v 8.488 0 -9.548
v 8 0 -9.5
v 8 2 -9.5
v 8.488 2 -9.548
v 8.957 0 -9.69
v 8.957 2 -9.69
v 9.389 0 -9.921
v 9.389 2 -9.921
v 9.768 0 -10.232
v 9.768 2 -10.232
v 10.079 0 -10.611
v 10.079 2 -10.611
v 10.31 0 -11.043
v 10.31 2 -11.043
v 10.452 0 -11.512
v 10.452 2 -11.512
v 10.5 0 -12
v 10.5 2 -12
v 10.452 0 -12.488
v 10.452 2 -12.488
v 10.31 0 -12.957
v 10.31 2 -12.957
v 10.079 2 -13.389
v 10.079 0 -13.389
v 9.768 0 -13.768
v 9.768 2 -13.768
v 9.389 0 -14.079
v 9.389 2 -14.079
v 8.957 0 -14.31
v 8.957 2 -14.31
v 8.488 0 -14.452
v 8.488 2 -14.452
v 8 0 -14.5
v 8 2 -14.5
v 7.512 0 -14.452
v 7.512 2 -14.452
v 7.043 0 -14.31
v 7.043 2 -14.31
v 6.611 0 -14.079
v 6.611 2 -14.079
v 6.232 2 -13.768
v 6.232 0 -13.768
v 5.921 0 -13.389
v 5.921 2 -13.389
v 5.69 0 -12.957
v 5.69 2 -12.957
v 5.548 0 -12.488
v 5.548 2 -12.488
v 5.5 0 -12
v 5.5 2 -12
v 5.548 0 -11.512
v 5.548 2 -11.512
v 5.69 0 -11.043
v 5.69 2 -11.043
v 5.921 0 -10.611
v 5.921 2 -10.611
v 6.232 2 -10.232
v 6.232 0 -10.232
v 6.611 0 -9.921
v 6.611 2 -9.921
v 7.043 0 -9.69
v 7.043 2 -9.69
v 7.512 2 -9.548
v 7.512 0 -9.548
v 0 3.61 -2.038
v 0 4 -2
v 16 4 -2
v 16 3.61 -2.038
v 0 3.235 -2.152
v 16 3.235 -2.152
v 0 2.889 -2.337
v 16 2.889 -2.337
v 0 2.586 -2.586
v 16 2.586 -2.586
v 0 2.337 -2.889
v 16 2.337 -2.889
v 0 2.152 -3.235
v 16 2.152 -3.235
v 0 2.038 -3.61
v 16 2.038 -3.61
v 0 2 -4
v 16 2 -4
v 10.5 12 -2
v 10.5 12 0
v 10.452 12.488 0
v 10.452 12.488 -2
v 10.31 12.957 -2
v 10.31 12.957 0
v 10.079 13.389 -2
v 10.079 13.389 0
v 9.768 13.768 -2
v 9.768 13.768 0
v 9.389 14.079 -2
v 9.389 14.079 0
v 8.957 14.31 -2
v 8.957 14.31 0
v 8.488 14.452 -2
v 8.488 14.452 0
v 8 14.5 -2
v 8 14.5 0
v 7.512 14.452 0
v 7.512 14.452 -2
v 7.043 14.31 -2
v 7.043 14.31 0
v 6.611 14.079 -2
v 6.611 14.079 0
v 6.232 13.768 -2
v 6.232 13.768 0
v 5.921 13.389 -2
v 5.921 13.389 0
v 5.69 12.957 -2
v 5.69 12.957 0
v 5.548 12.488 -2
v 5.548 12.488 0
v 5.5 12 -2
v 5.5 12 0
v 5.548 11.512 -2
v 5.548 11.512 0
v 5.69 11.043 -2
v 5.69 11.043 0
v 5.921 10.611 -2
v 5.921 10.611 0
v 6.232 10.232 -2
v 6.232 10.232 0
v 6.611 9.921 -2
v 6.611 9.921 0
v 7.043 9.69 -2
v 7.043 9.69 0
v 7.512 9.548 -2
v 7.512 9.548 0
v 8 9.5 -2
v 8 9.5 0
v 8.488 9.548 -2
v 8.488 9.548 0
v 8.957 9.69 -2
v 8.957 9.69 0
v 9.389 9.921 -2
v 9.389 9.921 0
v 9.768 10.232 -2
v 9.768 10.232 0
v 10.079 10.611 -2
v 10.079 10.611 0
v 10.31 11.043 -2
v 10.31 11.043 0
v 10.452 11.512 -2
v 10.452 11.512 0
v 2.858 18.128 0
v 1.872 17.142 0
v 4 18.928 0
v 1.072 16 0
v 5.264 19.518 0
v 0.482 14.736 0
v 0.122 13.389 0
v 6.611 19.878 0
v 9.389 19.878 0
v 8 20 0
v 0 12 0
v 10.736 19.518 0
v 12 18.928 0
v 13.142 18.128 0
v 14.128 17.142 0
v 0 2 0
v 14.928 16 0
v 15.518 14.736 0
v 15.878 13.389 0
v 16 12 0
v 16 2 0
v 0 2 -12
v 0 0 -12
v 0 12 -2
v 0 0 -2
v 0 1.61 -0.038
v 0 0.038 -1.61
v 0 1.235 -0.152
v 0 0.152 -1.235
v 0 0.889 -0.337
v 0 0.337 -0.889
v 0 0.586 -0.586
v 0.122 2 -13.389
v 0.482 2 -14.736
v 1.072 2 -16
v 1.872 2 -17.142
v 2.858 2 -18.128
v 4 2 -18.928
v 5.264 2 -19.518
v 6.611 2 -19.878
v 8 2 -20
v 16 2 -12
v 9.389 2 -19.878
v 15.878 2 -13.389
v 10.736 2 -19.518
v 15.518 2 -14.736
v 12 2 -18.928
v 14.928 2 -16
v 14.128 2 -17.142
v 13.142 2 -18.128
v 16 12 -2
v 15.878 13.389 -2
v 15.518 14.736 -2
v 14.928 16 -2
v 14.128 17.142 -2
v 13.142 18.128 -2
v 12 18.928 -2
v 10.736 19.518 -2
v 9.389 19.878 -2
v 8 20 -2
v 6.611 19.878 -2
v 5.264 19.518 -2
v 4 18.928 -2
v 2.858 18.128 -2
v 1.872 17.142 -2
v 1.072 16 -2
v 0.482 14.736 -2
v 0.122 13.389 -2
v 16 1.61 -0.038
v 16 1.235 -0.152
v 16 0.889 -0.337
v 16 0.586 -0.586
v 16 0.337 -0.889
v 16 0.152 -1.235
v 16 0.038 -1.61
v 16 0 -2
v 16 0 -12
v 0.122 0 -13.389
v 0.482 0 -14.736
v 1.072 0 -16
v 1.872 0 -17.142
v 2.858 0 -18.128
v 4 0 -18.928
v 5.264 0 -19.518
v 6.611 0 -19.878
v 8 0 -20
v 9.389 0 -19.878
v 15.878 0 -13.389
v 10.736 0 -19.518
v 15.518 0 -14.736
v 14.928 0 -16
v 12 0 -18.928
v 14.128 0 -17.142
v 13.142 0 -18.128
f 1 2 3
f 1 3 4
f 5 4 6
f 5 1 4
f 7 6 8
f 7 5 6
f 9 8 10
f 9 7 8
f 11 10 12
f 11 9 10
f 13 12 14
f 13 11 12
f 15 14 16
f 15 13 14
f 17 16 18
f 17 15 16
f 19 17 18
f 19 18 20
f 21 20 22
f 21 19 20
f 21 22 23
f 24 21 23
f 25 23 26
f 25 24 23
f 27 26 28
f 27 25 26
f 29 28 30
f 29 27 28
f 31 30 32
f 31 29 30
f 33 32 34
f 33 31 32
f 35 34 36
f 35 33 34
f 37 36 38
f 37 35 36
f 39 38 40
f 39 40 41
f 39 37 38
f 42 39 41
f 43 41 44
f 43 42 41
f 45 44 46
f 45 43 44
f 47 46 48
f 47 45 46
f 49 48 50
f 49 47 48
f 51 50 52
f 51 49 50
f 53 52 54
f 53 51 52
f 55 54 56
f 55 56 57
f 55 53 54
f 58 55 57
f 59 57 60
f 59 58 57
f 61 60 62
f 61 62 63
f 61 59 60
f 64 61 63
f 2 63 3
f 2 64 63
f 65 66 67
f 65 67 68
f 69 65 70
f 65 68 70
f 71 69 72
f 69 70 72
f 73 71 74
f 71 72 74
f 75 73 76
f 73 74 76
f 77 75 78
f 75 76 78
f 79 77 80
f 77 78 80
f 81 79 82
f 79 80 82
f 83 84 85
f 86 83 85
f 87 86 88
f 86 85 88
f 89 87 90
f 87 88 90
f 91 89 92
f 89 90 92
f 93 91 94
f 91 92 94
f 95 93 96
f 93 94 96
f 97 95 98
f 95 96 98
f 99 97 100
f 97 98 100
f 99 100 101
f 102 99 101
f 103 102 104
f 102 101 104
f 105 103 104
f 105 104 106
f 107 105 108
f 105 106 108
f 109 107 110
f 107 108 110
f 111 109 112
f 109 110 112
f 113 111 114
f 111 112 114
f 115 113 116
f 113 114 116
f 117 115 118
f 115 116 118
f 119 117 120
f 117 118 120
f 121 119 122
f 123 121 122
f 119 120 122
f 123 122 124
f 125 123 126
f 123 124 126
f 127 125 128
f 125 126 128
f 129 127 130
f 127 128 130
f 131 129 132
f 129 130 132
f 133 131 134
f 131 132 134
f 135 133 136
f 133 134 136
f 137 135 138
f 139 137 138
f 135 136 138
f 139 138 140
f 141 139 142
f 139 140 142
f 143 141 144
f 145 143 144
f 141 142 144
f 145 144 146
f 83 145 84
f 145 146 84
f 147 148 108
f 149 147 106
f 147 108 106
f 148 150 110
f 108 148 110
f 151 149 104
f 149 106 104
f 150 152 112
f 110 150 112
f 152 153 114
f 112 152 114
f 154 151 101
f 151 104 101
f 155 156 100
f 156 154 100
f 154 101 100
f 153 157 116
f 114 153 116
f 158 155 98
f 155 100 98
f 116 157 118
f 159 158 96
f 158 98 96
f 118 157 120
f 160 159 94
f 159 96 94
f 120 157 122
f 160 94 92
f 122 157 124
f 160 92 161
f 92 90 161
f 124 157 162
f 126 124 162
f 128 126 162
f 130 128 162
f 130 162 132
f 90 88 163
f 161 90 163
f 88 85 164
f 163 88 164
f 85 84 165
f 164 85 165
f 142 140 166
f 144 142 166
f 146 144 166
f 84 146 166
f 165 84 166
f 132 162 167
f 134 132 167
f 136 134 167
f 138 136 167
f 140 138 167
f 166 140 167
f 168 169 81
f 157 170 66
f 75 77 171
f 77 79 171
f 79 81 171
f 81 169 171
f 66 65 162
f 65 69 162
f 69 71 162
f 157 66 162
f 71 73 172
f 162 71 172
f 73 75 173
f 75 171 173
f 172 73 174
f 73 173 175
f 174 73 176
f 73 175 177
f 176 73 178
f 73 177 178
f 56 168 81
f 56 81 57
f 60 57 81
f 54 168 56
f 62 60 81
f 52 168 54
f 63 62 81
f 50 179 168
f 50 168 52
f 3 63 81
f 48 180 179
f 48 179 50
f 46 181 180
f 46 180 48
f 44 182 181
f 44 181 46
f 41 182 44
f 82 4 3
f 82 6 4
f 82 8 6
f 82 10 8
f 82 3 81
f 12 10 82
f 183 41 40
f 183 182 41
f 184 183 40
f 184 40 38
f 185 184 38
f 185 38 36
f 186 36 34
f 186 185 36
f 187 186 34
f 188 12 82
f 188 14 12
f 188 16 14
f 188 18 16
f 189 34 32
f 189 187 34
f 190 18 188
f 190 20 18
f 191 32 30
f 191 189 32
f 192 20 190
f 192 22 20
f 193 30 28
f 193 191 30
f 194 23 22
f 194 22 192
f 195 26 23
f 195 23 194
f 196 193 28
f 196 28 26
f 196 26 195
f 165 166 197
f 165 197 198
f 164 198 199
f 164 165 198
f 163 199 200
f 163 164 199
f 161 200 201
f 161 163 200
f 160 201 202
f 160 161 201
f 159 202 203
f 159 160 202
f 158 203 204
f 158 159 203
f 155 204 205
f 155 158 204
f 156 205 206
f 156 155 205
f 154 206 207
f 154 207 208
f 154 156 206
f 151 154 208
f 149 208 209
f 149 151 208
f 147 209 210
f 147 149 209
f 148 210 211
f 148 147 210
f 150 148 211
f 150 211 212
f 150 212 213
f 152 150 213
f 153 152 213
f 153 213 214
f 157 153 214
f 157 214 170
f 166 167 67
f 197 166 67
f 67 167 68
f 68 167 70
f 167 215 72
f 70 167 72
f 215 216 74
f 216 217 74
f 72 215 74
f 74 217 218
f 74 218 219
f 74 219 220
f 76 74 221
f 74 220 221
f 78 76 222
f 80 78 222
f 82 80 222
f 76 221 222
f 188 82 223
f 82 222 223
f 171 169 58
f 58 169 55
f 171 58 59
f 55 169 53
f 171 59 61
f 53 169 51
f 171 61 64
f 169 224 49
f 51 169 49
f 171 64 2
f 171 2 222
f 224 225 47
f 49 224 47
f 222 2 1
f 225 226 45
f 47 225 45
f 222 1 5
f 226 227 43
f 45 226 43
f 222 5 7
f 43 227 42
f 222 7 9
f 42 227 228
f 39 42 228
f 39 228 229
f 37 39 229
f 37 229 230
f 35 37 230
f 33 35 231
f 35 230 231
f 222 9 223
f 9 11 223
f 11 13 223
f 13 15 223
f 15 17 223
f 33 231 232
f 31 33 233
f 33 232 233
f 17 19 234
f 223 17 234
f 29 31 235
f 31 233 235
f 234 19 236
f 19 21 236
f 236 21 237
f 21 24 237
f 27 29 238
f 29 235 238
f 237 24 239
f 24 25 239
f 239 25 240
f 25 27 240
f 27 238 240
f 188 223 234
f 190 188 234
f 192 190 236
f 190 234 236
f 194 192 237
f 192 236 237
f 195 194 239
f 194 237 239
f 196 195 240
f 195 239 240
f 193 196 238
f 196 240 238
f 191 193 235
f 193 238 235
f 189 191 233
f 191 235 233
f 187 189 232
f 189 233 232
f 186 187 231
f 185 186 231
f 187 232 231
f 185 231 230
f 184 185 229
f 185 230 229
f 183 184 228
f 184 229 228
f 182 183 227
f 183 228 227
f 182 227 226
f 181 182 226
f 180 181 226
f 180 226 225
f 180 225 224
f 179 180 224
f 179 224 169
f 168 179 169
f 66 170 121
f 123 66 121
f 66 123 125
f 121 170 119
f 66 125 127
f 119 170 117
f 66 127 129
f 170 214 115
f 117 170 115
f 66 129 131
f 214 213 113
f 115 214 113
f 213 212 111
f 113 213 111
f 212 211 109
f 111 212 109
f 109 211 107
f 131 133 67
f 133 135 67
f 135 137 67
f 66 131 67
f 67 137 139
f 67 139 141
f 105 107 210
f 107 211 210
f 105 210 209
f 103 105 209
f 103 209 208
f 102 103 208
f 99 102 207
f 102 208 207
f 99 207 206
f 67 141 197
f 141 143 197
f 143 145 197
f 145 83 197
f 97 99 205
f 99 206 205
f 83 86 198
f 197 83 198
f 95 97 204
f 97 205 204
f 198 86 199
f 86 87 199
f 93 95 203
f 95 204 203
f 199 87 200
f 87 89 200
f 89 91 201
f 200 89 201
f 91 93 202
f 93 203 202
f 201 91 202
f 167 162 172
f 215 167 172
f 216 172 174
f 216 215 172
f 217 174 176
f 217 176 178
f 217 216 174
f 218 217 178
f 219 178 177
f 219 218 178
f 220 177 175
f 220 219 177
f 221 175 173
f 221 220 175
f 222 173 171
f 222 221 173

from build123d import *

# Parameters (mm, degrees)
SKETCH_2_R      = 2.5
EXTRUDE_1_DEPTH = 2
SKETCH_3_R      = 2.5
EXTRUDE_2_DEPTH = 2
FILLET_1_R      = 2


with BuildPart() as part:
    # 草图2 → 凸台-拉伸1 (new body)
    with BuildSketch(Plane(origin=(0, 0, 0), x_dir=(1, 0, 0), z_dir=(0, 1, 0))):
        with BuildLine():
            Line((0, 0), (16, 0))
            Line((16, 0), (16, 12))
            ThreePointArc((16, 12), (8, 20), (0, 12))
            Line((0, 12), (0, 0))
        make_face()
        with Locations(Location((8, 12, 0), (0, 0, 270))):
            Circle(SKETCH_2_R, mode=Mode.SUBTRACT)
    extrude(amount=EXTRUDE_1_DEPTH)

    # 草图3 → 凸台-拉伸2 (add)
    with BuildSketch(Plane.XY):
        with BuildLine():
            Line((0, 0), (16, 0))
            Line((16, 0), (16, 12))
            ThreePointArc((16, 12), (8, 20), (0, 12))
            Line((0, 12), (0, 0))
        make_face()
        with Locations((8, 12)):
            Circle(SKETCH_3_R, mode=Mode.SUBTRACT)
    extrude(amount=-EXTRUDE_2_DEPTH)

    # 圆角1
    fillet_1_edges = [part.edges().sort_by_distance(p)[0] for p in [
        (8, 2, -2),
        (8, 0, 0),
    ]]
    fillet(fillet_1_edges, radius=FILLET_1_R)


solid = part.part
